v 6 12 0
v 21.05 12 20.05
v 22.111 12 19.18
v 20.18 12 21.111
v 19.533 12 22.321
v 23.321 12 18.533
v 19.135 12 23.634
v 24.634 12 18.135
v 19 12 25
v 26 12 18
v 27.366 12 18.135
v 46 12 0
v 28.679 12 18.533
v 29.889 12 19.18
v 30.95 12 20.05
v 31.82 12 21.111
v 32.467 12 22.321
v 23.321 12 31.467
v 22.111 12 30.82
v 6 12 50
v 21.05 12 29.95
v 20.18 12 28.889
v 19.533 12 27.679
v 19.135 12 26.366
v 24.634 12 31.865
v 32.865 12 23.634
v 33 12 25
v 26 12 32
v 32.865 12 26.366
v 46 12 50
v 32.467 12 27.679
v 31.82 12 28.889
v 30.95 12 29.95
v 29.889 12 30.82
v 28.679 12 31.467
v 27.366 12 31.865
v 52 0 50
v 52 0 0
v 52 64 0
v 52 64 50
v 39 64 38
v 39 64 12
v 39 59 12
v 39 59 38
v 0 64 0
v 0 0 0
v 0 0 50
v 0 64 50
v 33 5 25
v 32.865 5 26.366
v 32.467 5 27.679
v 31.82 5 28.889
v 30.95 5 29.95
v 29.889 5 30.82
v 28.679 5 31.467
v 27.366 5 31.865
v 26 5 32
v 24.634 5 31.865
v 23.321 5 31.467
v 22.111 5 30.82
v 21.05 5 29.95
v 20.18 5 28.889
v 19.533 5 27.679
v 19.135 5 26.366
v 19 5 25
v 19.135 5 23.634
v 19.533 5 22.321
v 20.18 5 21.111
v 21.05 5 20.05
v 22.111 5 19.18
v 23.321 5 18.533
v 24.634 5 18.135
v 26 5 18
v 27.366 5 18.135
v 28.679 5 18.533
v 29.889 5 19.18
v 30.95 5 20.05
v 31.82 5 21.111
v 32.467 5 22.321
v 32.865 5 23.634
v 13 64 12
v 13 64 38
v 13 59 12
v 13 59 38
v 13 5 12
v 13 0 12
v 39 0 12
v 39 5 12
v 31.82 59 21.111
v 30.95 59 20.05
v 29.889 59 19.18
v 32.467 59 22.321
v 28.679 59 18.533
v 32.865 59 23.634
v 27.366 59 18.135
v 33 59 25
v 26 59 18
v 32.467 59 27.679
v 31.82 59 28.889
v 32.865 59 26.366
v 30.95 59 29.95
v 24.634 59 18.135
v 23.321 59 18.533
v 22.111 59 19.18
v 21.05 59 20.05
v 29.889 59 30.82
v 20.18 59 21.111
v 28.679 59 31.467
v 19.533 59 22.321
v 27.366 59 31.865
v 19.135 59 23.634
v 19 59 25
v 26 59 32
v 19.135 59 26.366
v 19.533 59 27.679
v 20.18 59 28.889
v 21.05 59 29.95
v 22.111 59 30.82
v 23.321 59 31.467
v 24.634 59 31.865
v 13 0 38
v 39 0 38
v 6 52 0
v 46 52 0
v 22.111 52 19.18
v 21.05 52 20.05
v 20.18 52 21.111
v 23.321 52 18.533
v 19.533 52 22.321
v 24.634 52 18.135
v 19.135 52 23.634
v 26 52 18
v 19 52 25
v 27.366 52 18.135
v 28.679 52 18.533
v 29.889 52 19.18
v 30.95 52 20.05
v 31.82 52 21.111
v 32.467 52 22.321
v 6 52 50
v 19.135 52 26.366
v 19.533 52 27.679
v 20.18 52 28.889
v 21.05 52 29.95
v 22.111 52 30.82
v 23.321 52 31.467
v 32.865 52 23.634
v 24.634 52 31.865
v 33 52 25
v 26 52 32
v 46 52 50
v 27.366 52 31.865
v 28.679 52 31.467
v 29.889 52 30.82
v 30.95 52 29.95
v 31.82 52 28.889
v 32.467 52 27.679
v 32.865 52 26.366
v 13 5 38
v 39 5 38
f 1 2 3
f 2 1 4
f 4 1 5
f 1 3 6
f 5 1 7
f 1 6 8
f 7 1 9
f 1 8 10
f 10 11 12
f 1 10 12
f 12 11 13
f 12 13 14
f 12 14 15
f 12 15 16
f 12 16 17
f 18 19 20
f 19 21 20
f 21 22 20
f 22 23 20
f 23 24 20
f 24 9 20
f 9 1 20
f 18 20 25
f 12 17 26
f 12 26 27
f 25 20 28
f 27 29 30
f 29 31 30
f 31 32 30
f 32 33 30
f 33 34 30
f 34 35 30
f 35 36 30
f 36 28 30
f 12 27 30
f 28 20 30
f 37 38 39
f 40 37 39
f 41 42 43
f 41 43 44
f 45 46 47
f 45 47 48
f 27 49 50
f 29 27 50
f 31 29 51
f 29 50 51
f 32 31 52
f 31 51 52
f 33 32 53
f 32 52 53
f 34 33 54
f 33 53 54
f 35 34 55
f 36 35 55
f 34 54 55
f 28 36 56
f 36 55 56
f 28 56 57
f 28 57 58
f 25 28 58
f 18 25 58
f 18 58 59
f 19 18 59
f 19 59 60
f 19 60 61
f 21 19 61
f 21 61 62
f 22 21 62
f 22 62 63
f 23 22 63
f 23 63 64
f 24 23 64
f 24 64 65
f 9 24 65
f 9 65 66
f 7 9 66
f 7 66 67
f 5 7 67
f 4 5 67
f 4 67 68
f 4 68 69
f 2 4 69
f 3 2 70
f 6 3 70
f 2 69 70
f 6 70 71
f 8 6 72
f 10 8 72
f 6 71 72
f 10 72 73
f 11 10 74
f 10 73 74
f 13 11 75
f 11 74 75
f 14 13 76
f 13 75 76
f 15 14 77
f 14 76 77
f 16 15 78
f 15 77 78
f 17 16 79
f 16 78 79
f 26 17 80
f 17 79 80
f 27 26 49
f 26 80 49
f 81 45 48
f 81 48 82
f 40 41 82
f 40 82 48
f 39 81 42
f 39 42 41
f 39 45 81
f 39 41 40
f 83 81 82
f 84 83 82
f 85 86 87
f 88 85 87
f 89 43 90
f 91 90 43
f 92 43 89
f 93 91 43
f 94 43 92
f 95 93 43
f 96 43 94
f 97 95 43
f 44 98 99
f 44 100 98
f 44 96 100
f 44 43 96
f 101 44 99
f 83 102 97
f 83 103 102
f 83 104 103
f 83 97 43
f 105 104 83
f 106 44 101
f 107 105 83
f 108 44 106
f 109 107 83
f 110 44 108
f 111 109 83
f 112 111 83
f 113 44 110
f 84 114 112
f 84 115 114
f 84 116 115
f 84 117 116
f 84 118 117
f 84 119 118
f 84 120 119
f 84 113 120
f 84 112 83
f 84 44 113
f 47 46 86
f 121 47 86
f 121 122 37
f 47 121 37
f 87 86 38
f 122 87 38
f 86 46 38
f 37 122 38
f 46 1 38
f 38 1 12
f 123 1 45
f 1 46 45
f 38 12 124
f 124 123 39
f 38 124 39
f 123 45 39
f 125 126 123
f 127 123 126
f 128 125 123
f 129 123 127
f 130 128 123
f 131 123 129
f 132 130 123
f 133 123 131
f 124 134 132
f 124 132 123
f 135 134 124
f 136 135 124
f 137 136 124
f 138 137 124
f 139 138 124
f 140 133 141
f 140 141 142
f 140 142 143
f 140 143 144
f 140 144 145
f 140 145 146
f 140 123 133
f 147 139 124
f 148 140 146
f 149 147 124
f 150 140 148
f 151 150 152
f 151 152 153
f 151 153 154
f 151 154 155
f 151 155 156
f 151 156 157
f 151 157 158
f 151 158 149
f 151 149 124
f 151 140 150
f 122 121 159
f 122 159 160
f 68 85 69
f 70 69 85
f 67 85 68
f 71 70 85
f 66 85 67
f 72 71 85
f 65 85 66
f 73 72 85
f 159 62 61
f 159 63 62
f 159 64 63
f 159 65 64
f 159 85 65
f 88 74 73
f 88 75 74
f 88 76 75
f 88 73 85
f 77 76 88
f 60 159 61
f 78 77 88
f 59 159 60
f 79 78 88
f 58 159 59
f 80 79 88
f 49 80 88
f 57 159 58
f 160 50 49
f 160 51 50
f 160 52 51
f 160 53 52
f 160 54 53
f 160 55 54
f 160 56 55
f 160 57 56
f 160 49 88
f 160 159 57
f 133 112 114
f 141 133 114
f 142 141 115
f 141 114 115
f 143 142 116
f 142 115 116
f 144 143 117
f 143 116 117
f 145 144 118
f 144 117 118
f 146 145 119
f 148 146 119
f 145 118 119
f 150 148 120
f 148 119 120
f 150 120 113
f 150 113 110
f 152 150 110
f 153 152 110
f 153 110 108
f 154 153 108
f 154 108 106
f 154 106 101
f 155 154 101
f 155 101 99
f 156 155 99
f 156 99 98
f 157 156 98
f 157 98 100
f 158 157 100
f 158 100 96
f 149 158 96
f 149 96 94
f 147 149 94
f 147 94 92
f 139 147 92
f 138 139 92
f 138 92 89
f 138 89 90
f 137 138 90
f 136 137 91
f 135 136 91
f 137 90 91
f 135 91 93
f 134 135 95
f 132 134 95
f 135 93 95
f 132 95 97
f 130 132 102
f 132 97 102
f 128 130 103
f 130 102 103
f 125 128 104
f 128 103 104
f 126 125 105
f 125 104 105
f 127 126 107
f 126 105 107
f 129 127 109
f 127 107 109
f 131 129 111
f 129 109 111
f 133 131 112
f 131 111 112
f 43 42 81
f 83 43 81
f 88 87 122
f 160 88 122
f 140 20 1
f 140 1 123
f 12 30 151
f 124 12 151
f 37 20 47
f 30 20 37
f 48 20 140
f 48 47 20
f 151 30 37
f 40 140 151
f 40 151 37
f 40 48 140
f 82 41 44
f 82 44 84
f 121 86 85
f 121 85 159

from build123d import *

# Parameters (mm, degrees)
F0_W      = 52
F0_H      = 64
F1_DEPTH  = 50
F2_W      = 40
F2_H      = 40
F3_DEPTH  = 50
F4_W      = 26
F4_H      = 26
F5_DEPTH  = 5
F6_R      = 7
F7_DEPTH  = 40
F8_W      = 26
F8_H      = 26
F9_DEPTH  = 5
F10_R     = 7
F11_DEPTH = 25


with BuildPart() as f1:
    # F0 (on Top) → F1 (new body)
    with BuildSketch(Plane.XY):
        with Locations((26, 32)):
            Rectangle(F0_W, F0_H)
    extrude(amount=F1_DEPTH)

    # F2 (on face) → F3 (cut)
    with BuildSketch(Plane.XY.offset(50)):
        with Locations((26, 32)):
            Rectangle(F2_W, F2_H)
    extrude(amount=-F3_DEPTH, mode=Mode.SUBTRACT)

    # F4 (on face) → F5 (cut)
    with BuildSketch(Plane.XZ):
        with Locations((26, 25)):
            Rectangle(F4_W, F4_H)
    extrude(amount=-F5_DEPTH, mode=Mode.SUBTRACT)

    # F6 (on face) → F7 (cut)
    with BuildSketch(Plane.XZ.offset(-5)):
        with Locations((26, 25)):
            Circle(F6_R)
    extrude(amount=-F7_DEPTH, mode=Mode.SUBTRACT)

    # F8 (on face) → F9 (cut)
    with BuildSketch(Plane(origin=(0, 64, 0), x_dir=(-1, 0, 0), z_dir=(0, 1, 0))):
        with Locations((-26, 25)):
            Rectangle(F8_W, F8_H)
    extrude(amount=-F9_DEPTH, mode=Mode.SUBTRACT)

    # F10 (on face) → F11 (cut)
    with BuildSketch(Plane(origin=(0, 59, 0), x_dir=(-1, 0, 0), z_dir=(0, 1, 0))):
        with Locations((-26, 25)):
            Circle(F10_R)
    extrude(amount=-F11_DEPTH, mode=Mode.SUBTRACT)


solid = f1.part
